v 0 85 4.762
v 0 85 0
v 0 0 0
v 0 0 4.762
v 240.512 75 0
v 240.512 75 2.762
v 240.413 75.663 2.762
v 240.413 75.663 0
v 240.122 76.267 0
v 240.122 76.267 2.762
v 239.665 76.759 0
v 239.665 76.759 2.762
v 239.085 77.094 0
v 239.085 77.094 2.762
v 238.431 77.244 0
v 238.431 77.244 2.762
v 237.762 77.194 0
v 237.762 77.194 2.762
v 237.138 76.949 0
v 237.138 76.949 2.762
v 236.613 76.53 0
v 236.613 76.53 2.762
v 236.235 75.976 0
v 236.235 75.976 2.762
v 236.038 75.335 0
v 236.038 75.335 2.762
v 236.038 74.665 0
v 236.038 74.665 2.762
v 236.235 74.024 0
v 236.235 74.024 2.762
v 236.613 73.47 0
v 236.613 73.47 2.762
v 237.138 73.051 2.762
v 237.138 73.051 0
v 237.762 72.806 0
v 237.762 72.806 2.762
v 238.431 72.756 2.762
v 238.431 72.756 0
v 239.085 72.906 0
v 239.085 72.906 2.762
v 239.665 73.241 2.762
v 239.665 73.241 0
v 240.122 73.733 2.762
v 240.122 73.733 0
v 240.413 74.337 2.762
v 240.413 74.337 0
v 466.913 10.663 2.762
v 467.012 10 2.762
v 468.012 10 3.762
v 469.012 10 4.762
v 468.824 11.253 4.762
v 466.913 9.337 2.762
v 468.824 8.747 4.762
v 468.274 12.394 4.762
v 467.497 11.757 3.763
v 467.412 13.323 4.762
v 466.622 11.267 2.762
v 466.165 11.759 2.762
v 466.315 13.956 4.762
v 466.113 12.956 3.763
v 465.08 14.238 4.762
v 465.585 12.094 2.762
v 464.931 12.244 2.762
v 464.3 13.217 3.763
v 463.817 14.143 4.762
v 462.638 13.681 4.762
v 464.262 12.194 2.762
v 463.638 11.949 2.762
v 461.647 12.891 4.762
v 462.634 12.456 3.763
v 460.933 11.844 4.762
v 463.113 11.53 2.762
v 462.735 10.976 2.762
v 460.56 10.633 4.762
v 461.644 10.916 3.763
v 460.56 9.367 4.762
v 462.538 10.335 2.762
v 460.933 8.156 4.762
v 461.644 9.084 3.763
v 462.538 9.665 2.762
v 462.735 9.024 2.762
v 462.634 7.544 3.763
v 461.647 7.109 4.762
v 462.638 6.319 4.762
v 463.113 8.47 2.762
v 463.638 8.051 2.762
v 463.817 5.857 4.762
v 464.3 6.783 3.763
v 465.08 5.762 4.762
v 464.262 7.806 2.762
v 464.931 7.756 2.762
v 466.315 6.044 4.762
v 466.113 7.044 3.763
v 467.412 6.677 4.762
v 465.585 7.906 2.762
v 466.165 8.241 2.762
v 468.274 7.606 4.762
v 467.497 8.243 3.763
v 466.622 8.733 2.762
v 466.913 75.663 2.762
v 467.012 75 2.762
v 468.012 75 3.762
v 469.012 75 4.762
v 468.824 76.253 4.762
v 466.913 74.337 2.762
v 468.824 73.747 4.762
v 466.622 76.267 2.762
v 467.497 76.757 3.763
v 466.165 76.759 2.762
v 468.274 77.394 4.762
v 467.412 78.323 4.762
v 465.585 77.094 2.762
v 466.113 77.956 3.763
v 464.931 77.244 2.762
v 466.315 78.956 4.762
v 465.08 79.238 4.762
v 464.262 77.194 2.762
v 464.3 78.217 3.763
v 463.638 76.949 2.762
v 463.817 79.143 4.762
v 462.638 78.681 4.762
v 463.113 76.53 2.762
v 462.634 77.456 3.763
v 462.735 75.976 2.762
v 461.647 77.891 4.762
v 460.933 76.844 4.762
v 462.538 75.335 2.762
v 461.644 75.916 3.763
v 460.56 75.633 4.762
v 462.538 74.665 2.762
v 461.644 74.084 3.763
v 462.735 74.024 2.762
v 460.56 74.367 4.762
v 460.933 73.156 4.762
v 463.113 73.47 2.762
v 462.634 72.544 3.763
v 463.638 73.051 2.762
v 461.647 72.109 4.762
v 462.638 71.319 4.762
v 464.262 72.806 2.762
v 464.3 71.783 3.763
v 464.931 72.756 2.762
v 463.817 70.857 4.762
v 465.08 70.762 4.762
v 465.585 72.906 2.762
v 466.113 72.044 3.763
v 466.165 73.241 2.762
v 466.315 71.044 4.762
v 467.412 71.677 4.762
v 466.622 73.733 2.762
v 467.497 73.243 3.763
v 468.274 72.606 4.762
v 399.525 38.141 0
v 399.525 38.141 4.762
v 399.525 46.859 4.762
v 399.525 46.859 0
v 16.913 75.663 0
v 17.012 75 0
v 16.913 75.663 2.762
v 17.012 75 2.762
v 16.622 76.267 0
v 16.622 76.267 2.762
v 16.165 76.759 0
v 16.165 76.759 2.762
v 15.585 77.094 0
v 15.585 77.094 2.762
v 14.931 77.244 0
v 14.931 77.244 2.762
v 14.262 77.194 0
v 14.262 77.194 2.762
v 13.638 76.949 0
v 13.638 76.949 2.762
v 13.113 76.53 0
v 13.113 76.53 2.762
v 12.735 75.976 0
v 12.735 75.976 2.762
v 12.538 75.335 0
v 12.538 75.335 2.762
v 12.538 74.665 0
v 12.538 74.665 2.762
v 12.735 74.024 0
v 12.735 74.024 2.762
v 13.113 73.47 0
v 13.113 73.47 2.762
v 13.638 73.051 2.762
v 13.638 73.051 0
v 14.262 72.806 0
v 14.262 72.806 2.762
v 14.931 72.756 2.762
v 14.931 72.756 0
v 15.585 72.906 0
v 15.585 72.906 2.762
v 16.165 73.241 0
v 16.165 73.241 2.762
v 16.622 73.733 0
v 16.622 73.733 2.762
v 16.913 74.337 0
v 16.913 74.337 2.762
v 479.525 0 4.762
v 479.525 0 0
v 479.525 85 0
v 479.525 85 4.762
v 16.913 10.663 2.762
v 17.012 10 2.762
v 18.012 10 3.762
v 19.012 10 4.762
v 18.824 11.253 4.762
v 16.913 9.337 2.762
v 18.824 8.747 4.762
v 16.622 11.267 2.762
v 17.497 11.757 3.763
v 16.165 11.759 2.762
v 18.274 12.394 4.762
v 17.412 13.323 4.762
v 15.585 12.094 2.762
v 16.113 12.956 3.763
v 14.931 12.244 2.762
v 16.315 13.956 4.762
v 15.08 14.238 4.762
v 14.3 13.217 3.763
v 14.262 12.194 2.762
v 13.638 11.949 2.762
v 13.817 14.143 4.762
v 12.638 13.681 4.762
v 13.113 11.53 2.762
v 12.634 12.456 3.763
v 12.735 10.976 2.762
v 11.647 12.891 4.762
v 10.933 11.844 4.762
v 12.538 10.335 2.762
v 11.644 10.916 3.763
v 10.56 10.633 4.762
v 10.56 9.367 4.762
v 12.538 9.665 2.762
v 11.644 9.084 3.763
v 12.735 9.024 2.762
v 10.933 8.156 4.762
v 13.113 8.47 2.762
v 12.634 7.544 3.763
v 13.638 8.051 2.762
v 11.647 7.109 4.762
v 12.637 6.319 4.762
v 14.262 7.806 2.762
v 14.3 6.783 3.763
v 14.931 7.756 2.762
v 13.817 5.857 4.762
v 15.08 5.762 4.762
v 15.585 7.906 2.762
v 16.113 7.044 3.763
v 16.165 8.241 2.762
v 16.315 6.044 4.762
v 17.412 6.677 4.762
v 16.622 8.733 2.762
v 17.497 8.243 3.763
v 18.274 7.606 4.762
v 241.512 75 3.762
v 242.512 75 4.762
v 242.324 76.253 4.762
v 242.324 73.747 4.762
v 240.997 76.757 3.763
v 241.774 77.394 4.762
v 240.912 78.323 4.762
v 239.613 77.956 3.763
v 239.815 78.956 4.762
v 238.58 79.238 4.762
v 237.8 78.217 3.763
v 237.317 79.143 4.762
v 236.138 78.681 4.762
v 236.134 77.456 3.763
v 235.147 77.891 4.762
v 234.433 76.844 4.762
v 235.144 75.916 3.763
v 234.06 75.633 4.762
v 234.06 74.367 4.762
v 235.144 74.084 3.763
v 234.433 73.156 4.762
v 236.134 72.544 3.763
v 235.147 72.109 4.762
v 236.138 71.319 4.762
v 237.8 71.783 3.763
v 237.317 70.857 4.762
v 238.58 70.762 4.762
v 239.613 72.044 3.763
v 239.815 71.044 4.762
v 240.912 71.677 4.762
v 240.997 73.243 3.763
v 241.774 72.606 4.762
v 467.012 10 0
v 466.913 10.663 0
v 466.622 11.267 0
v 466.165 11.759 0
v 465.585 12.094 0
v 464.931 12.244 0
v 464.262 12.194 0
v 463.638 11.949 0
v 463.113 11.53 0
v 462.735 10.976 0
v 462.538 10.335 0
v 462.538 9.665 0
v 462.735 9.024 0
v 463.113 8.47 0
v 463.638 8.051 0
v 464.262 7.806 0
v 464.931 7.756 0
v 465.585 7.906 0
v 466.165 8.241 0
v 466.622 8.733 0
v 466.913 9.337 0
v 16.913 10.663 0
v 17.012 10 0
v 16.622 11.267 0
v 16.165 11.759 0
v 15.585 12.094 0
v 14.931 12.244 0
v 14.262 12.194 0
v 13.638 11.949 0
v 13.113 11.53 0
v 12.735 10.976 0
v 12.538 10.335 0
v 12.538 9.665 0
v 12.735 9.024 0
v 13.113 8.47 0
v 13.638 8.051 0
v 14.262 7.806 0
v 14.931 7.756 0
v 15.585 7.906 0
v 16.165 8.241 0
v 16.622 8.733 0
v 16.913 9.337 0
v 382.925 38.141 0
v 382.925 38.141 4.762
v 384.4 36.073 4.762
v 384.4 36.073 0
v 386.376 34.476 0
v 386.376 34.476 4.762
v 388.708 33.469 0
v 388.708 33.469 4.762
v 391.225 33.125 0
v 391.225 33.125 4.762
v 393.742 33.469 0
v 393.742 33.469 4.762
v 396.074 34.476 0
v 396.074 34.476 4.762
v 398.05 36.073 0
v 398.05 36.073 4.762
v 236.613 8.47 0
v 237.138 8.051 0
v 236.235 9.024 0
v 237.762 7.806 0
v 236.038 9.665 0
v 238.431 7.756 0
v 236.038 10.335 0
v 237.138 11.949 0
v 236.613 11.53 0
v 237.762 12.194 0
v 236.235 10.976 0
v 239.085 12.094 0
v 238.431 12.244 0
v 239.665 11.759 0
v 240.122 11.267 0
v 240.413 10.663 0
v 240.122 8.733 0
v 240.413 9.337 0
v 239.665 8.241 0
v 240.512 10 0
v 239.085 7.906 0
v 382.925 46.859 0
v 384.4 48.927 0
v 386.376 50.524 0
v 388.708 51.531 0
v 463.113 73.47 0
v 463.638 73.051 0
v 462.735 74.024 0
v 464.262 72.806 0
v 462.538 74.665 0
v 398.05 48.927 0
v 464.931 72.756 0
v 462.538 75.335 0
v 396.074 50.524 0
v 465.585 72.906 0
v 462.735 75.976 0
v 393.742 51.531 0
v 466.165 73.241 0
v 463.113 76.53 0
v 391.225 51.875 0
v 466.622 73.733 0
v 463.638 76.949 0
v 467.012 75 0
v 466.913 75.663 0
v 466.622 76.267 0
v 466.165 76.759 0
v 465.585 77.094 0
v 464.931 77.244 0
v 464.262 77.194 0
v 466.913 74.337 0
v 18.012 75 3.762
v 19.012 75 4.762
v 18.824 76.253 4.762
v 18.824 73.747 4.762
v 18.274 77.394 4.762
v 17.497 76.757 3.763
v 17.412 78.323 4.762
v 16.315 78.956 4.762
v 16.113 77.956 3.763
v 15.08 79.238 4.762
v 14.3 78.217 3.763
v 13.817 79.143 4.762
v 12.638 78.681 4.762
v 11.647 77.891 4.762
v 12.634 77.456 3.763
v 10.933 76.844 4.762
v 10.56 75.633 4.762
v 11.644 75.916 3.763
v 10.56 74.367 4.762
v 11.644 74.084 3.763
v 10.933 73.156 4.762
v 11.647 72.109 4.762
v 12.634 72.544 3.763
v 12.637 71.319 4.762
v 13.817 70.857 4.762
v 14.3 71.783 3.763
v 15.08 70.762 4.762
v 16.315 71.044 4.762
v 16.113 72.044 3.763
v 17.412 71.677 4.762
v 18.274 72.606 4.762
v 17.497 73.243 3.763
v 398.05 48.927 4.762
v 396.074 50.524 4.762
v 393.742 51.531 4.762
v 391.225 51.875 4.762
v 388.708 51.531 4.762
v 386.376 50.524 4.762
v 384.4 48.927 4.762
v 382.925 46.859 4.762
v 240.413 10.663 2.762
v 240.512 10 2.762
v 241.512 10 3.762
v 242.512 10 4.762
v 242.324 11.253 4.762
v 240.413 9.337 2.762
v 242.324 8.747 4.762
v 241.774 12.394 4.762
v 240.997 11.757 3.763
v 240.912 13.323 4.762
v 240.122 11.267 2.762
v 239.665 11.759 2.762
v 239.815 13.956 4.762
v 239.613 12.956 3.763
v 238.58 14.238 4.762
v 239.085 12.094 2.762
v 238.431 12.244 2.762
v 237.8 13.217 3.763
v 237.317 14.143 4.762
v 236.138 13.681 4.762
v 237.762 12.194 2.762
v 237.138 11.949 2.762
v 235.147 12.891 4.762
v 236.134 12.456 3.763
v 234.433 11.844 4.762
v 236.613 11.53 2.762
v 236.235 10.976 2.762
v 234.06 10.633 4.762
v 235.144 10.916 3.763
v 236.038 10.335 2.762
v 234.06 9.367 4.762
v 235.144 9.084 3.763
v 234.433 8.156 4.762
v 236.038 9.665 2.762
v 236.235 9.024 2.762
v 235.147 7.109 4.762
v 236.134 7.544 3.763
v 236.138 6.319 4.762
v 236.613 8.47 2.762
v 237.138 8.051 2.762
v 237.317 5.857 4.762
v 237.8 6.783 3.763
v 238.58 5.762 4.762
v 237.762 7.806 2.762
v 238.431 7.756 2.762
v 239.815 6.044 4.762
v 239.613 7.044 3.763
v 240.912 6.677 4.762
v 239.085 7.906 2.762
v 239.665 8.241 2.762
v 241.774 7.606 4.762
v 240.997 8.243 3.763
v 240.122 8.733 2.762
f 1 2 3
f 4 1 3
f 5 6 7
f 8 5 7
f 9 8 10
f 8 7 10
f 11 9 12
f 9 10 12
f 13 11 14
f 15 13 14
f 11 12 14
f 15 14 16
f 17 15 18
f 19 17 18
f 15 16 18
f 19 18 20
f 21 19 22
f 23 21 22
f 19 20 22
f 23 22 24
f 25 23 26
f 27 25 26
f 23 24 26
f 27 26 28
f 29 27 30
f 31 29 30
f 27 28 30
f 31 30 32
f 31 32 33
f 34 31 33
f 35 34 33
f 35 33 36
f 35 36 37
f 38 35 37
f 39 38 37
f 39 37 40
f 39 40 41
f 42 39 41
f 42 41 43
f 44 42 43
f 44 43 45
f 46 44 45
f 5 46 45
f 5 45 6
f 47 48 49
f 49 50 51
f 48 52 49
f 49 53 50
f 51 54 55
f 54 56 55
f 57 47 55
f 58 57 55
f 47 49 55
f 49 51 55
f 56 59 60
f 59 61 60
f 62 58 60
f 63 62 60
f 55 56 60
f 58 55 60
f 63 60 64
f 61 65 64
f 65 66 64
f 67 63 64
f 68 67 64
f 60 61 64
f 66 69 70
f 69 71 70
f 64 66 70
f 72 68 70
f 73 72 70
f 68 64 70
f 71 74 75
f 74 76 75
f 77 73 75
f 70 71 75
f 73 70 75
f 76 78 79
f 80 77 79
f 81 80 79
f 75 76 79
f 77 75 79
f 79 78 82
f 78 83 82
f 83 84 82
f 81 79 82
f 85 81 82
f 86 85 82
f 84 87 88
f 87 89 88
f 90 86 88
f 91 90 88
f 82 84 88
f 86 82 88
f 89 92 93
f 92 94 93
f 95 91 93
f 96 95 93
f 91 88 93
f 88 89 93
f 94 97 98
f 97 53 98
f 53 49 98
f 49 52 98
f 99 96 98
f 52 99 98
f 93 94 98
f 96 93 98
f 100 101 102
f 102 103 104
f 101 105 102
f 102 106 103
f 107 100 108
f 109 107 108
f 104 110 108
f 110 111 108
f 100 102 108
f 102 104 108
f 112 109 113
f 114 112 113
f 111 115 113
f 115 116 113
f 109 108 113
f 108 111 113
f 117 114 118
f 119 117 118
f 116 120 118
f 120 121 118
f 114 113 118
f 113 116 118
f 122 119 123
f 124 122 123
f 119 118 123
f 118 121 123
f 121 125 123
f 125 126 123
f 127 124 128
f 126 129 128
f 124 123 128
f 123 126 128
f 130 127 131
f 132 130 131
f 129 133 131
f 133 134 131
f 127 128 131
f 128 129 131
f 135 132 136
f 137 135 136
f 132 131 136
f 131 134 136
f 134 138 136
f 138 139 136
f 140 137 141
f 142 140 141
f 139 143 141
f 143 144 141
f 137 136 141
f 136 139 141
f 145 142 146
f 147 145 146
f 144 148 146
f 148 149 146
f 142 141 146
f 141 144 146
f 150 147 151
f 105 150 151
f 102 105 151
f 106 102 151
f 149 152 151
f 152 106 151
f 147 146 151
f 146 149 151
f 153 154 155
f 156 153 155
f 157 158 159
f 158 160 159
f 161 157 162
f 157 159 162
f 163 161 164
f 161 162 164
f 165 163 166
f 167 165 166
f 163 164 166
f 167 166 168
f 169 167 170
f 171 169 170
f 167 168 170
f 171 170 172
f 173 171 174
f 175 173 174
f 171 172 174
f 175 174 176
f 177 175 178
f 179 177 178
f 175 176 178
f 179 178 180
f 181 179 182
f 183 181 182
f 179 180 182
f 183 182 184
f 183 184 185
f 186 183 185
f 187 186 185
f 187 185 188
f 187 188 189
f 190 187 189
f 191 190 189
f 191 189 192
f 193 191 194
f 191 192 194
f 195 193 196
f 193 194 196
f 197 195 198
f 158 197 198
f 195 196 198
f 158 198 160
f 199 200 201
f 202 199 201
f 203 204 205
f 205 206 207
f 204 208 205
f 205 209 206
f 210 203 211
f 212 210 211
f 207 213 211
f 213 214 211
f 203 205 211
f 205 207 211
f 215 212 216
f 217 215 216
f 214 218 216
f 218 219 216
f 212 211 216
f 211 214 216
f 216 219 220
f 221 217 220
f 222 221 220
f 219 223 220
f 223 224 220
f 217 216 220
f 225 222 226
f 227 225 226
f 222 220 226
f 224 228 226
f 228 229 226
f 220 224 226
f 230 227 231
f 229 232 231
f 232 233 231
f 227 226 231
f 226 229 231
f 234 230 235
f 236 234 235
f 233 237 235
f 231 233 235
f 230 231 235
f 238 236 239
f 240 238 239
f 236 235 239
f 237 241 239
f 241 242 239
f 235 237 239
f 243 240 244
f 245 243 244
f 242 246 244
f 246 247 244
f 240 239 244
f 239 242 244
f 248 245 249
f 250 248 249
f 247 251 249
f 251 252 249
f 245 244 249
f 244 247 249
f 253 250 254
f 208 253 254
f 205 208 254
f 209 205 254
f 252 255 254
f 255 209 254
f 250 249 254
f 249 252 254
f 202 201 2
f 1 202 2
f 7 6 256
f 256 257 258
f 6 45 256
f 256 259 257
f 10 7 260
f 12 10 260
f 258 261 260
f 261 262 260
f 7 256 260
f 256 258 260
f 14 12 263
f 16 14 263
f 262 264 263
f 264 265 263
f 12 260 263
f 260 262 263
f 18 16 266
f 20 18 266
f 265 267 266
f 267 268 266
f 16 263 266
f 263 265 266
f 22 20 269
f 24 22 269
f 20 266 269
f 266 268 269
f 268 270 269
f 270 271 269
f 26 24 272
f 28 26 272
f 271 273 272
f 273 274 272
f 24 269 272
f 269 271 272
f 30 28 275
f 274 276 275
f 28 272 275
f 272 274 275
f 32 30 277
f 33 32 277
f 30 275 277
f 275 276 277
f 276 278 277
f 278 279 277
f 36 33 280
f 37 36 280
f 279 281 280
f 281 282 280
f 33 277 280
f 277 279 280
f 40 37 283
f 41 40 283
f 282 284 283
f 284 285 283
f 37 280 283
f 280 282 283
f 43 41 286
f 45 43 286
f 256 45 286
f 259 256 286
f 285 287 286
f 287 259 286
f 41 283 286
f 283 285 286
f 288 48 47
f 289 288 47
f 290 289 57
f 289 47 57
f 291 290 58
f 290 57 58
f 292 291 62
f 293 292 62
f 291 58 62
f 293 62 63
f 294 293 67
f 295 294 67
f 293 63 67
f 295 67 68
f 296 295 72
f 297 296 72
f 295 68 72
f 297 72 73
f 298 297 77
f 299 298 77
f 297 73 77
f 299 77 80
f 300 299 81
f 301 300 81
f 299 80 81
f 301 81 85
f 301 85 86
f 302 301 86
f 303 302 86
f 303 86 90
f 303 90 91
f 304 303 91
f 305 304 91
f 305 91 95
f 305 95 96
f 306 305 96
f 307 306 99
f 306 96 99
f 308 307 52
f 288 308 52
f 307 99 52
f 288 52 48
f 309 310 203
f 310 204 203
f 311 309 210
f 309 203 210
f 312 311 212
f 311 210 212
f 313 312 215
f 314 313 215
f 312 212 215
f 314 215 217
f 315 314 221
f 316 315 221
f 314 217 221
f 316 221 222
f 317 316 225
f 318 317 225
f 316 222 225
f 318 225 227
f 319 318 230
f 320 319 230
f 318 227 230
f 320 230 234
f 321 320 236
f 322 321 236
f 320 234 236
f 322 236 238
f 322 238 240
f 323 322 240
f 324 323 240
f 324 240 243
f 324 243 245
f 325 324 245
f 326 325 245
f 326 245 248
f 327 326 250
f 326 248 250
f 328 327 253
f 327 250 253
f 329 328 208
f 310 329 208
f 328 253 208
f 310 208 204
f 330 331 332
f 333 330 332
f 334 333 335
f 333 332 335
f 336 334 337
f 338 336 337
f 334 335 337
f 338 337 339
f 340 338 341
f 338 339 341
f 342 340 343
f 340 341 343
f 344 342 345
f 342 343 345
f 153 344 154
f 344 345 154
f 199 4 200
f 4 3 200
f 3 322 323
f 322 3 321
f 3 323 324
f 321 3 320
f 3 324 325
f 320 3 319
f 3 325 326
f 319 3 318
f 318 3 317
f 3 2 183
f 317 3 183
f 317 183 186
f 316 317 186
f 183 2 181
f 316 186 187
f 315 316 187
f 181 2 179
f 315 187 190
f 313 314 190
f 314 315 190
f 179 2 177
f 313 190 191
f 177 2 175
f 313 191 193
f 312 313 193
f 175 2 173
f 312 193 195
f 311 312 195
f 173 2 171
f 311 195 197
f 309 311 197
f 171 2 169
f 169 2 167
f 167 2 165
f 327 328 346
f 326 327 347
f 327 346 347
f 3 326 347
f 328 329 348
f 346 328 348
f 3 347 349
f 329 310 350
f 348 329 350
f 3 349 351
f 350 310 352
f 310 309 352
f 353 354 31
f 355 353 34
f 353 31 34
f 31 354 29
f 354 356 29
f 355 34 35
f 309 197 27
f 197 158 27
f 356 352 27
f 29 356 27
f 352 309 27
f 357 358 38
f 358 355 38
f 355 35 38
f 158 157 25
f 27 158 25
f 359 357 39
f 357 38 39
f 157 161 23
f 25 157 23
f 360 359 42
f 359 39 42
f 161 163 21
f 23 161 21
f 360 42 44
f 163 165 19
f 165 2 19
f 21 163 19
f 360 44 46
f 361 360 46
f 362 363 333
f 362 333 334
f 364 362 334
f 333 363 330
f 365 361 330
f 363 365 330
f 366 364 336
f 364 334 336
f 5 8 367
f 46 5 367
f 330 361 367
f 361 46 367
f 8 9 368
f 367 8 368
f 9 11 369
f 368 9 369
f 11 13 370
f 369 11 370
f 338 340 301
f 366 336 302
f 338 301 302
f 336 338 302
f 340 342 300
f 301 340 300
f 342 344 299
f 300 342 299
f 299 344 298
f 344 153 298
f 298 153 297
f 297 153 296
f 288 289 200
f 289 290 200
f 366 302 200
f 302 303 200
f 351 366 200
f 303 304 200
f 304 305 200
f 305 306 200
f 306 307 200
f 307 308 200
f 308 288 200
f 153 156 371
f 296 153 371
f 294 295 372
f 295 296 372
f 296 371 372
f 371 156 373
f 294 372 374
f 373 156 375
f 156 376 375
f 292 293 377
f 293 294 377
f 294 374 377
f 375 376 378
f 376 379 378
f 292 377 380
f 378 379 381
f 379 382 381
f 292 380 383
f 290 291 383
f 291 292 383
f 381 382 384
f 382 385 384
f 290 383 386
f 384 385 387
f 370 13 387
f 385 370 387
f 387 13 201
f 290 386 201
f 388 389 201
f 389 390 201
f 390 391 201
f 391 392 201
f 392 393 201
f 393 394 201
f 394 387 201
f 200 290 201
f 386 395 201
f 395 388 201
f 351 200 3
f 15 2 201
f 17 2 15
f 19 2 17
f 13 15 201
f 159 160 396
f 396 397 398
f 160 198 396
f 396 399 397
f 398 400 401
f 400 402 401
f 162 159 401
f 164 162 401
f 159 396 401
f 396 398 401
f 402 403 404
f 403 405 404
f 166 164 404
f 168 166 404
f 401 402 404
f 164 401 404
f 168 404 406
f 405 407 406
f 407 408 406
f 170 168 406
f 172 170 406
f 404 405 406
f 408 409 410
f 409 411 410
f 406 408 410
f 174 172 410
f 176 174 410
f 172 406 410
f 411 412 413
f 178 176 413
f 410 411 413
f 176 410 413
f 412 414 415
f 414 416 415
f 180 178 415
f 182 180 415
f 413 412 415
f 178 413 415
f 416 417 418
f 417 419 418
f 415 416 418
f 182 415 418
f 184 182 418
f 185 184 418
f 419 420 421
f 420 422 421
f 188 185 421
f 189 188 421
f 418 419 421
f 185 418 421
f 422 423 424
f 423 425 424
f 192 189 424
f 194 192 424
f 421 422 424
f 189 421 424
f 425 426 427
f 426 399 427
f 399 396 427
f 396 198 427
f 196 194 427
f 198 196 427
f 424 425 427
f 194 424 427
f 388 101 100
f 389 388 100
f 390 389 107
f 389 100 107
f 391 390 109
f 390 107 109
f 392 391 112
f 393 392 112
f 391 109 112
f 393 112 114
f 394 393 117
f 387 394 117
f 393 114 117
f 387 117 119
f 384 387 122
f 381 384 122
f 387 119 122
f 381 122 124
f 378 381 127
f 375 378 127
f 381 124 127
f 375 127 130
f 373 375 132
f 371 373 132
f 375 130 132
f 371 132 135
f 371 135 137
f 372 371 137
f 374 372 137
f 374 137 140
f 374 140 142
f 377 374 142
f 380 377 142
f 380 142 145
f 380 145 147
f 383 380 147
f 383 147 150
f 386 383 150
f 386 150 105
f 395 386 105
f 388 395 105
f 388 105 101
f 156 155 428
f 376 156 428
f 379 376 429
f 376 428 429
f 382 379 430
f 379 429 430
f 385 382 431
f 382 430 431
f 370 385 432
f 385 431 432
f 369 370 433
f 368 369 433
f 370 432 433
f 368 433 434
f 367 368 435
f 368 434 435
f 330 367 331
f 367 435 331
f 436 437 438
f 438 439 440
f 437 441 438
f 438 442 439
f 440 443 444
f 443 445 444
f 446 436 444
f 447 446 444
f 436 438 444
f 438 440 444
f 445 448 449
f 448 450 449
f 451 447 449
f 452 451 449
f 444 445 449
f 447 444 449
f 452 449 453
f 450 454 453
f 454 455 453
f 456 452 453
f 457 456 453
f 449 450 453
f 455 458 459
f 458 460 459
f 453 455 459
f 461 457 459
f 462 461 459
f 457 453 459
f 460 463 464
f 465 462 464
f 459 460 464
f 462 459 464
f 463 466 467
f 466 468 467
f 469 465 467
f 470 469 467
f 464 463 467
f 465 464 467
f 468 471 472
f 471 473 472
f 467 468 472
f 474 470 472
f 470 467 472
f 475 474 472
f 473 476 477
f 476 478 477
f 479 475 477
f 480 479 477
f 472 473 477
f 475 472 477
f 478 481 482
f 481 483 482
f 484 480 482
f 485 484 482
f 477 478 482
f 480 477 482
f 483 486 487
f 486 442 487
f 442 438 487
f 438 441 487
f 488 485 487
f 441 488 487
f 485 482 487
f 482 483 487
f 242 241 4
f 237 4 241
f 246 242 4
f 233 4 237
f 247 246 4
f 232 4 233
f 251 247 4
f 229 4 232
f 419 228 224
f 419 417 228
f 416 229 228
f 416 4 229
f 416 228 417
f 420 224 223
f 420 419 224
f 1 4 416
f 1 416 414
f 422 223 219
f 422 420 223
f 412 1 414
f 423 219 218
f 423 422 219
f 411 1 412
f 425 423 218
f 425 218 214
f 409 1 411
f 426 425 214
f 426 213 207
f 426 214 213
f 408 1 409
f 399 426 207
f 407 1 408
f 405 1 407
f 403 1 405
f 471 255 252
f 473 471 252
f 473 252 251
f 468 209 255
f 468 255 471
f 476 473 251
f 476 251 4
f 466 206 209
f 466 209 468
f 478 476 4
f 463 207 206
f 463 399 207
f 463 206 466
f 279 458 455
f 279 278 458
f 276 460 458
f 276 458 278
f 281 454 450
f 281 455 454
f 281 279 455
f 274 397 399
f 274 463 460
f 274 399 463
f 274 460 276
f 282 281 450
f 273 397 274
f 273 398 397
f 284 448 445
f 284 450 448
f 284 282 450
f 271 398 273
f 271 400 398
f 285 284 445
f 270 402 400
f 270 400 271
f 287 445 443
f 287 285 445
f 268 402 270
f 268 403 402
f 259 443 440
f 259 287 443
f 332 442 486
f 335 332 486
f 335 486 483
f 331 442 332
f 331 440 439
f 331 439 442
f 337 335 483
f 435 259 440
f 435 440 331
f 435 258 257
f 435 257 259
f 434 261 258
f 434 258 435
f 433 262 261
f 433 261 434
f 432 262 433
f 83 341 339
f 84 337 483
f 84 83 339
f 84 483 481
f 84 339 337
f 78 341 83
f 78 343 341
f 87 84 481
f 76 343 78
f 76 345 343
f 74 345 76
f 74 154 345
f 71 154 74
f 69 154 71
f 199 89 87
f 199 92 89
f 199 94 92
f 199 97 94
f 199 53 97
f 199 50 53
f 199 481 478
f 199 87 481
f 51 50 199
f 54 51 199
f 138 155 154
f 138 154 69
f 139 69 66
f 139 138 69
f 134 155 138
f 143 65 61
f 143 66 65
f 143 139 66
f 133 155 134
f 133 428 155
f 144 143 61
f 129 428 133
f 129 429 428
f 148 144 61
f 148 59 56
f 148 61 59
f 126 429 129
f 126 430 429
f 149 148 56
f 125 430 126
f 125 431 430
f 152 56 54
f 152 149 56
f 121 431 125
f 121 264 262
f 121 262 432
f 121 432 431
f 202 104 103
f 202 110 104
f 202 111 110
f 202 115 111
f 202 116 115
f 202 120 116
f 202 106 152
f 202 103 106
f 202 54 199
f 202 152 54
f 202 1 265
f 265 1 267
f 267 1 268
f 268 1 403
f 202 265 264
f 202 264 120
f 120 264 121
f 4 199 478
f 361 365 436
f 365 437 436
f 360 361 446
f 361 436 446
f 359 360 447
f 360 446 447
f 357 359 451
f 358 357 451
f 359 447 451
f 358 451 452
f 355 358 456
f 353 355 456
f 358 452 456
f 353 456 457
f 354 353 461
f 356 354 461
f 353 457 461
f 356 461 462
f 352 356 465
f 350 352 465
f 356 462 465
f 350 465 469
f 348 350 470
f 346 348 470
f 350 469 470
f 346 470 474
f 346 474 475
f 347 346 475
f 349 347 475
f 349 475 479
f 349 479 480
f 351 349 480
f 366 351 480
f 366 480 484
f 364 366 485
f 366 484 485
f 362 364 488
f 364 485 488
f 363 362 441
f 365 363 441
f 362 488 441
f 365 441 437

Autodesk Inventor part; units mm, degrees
ref_plane "YZ Plane" through (0, 0, 0) normal (1, 0, 0) x (0, 1, 0)
ref_plane "XZ Plane" through (0, 0, 0) normal (0, 1, 0) x (-1, 0, 0)
ref_plane "XY Plane" through (0, 0, 0) normal (0, 0, 1) x (1, 0, 0)
sketch "Sketch1" plane through (0, 0, 0) normal (0, 0, 1) x (1, 0, 0)
  line L0 (0, 0) -> (479.525, 0)
  line L1 (479.525, 0) -> (479.525, 85)
  line L2 (479.525, 85) -> (0, 85)
  line L3 (0, 85) -> (0, 0)
  dimension "d0" = 479.525
  dimension "d1" = 85
extrude "Extrusion1" add sketch "Sketch1" along normal blind 4.7625
sketch "Sketch2" plane through (0, 0, 4.7625) normal (0, 0, 1) x (1, 0, 0)
  line L0 (0, 0) -> (479.525, 0) projected
  line L1 (382.925, 46.859) -> (382.925, 38.141)
  line L2 (399.525, 38.141) -> (399.525, 46.859)
  arc A0 (382.925, 38.141) -> (399.525, 38.141) centre (391.225, 42.5) ccw
  arc A1 (399.525, 46.859) -> (382.925, 46.859) centre (391.225, 42.5) ccw
  line L3 (479.525, 0) -> (479.525, 85) projected
  dimension "d5" = 16.6
  dimension "d6" = 9.375
  dimension "d7" = 9.375
  dimension "d8" = 42.5
  dimension "d23" = 80
extrude "Extrusion2" cut sketch "Sketch2" against normal up to next
sketch "Sketch3" plane through (0, 0, 4.7625) normal (0, 0, 1) x (1, 0, 0)
  line L0 (0, 0) -> (479.525, 0) projected
  line L1 (479.525, 0) -> (479.525, 85) projected
  line L2 (479.525, 85) -> (0, 85) projected
  line L3 (0, 85) -> (0, 0) projected
  circle A0 centre (14.7625, 75) radius 2.25
  circle A1 centre (14.7625, 10) radius 2.25
  circle A2 centre (464.7625, 75) radius 2.25
  circle A3 centre (464.7625, 10) radius 2.25
  circle A4 centre (238.2625, 10) radius 2.25
  circle A5 centre (238.2625, 75) radius 2.25
  dimension "d12" = 4.5
  dimension "d13" = 14.7625
  dimension "d14" = 14.7625
  dimension "d15" = 10
  dimension "d16" = 10
  dimension "d17" = 241.2625
extrude "Extrusion3" cut sketch "Sketch3" against normal up to next contours A0 | A1 | A2 | A3 | A4 | A5
chamfer "Chamfer1" distance 2 angle 45 6 edges at (236.0125, 75, 4.7625) (236.0125, 10, 4.7625) (462.5125, 10, 4.7625) (462.5125, 75, 4.7625) (12.5125, 75, 4.7625) (12.5125, 10, 4.7625)
properties part number "EnclosurePanelBottomFront" material "ABS Plastic"
